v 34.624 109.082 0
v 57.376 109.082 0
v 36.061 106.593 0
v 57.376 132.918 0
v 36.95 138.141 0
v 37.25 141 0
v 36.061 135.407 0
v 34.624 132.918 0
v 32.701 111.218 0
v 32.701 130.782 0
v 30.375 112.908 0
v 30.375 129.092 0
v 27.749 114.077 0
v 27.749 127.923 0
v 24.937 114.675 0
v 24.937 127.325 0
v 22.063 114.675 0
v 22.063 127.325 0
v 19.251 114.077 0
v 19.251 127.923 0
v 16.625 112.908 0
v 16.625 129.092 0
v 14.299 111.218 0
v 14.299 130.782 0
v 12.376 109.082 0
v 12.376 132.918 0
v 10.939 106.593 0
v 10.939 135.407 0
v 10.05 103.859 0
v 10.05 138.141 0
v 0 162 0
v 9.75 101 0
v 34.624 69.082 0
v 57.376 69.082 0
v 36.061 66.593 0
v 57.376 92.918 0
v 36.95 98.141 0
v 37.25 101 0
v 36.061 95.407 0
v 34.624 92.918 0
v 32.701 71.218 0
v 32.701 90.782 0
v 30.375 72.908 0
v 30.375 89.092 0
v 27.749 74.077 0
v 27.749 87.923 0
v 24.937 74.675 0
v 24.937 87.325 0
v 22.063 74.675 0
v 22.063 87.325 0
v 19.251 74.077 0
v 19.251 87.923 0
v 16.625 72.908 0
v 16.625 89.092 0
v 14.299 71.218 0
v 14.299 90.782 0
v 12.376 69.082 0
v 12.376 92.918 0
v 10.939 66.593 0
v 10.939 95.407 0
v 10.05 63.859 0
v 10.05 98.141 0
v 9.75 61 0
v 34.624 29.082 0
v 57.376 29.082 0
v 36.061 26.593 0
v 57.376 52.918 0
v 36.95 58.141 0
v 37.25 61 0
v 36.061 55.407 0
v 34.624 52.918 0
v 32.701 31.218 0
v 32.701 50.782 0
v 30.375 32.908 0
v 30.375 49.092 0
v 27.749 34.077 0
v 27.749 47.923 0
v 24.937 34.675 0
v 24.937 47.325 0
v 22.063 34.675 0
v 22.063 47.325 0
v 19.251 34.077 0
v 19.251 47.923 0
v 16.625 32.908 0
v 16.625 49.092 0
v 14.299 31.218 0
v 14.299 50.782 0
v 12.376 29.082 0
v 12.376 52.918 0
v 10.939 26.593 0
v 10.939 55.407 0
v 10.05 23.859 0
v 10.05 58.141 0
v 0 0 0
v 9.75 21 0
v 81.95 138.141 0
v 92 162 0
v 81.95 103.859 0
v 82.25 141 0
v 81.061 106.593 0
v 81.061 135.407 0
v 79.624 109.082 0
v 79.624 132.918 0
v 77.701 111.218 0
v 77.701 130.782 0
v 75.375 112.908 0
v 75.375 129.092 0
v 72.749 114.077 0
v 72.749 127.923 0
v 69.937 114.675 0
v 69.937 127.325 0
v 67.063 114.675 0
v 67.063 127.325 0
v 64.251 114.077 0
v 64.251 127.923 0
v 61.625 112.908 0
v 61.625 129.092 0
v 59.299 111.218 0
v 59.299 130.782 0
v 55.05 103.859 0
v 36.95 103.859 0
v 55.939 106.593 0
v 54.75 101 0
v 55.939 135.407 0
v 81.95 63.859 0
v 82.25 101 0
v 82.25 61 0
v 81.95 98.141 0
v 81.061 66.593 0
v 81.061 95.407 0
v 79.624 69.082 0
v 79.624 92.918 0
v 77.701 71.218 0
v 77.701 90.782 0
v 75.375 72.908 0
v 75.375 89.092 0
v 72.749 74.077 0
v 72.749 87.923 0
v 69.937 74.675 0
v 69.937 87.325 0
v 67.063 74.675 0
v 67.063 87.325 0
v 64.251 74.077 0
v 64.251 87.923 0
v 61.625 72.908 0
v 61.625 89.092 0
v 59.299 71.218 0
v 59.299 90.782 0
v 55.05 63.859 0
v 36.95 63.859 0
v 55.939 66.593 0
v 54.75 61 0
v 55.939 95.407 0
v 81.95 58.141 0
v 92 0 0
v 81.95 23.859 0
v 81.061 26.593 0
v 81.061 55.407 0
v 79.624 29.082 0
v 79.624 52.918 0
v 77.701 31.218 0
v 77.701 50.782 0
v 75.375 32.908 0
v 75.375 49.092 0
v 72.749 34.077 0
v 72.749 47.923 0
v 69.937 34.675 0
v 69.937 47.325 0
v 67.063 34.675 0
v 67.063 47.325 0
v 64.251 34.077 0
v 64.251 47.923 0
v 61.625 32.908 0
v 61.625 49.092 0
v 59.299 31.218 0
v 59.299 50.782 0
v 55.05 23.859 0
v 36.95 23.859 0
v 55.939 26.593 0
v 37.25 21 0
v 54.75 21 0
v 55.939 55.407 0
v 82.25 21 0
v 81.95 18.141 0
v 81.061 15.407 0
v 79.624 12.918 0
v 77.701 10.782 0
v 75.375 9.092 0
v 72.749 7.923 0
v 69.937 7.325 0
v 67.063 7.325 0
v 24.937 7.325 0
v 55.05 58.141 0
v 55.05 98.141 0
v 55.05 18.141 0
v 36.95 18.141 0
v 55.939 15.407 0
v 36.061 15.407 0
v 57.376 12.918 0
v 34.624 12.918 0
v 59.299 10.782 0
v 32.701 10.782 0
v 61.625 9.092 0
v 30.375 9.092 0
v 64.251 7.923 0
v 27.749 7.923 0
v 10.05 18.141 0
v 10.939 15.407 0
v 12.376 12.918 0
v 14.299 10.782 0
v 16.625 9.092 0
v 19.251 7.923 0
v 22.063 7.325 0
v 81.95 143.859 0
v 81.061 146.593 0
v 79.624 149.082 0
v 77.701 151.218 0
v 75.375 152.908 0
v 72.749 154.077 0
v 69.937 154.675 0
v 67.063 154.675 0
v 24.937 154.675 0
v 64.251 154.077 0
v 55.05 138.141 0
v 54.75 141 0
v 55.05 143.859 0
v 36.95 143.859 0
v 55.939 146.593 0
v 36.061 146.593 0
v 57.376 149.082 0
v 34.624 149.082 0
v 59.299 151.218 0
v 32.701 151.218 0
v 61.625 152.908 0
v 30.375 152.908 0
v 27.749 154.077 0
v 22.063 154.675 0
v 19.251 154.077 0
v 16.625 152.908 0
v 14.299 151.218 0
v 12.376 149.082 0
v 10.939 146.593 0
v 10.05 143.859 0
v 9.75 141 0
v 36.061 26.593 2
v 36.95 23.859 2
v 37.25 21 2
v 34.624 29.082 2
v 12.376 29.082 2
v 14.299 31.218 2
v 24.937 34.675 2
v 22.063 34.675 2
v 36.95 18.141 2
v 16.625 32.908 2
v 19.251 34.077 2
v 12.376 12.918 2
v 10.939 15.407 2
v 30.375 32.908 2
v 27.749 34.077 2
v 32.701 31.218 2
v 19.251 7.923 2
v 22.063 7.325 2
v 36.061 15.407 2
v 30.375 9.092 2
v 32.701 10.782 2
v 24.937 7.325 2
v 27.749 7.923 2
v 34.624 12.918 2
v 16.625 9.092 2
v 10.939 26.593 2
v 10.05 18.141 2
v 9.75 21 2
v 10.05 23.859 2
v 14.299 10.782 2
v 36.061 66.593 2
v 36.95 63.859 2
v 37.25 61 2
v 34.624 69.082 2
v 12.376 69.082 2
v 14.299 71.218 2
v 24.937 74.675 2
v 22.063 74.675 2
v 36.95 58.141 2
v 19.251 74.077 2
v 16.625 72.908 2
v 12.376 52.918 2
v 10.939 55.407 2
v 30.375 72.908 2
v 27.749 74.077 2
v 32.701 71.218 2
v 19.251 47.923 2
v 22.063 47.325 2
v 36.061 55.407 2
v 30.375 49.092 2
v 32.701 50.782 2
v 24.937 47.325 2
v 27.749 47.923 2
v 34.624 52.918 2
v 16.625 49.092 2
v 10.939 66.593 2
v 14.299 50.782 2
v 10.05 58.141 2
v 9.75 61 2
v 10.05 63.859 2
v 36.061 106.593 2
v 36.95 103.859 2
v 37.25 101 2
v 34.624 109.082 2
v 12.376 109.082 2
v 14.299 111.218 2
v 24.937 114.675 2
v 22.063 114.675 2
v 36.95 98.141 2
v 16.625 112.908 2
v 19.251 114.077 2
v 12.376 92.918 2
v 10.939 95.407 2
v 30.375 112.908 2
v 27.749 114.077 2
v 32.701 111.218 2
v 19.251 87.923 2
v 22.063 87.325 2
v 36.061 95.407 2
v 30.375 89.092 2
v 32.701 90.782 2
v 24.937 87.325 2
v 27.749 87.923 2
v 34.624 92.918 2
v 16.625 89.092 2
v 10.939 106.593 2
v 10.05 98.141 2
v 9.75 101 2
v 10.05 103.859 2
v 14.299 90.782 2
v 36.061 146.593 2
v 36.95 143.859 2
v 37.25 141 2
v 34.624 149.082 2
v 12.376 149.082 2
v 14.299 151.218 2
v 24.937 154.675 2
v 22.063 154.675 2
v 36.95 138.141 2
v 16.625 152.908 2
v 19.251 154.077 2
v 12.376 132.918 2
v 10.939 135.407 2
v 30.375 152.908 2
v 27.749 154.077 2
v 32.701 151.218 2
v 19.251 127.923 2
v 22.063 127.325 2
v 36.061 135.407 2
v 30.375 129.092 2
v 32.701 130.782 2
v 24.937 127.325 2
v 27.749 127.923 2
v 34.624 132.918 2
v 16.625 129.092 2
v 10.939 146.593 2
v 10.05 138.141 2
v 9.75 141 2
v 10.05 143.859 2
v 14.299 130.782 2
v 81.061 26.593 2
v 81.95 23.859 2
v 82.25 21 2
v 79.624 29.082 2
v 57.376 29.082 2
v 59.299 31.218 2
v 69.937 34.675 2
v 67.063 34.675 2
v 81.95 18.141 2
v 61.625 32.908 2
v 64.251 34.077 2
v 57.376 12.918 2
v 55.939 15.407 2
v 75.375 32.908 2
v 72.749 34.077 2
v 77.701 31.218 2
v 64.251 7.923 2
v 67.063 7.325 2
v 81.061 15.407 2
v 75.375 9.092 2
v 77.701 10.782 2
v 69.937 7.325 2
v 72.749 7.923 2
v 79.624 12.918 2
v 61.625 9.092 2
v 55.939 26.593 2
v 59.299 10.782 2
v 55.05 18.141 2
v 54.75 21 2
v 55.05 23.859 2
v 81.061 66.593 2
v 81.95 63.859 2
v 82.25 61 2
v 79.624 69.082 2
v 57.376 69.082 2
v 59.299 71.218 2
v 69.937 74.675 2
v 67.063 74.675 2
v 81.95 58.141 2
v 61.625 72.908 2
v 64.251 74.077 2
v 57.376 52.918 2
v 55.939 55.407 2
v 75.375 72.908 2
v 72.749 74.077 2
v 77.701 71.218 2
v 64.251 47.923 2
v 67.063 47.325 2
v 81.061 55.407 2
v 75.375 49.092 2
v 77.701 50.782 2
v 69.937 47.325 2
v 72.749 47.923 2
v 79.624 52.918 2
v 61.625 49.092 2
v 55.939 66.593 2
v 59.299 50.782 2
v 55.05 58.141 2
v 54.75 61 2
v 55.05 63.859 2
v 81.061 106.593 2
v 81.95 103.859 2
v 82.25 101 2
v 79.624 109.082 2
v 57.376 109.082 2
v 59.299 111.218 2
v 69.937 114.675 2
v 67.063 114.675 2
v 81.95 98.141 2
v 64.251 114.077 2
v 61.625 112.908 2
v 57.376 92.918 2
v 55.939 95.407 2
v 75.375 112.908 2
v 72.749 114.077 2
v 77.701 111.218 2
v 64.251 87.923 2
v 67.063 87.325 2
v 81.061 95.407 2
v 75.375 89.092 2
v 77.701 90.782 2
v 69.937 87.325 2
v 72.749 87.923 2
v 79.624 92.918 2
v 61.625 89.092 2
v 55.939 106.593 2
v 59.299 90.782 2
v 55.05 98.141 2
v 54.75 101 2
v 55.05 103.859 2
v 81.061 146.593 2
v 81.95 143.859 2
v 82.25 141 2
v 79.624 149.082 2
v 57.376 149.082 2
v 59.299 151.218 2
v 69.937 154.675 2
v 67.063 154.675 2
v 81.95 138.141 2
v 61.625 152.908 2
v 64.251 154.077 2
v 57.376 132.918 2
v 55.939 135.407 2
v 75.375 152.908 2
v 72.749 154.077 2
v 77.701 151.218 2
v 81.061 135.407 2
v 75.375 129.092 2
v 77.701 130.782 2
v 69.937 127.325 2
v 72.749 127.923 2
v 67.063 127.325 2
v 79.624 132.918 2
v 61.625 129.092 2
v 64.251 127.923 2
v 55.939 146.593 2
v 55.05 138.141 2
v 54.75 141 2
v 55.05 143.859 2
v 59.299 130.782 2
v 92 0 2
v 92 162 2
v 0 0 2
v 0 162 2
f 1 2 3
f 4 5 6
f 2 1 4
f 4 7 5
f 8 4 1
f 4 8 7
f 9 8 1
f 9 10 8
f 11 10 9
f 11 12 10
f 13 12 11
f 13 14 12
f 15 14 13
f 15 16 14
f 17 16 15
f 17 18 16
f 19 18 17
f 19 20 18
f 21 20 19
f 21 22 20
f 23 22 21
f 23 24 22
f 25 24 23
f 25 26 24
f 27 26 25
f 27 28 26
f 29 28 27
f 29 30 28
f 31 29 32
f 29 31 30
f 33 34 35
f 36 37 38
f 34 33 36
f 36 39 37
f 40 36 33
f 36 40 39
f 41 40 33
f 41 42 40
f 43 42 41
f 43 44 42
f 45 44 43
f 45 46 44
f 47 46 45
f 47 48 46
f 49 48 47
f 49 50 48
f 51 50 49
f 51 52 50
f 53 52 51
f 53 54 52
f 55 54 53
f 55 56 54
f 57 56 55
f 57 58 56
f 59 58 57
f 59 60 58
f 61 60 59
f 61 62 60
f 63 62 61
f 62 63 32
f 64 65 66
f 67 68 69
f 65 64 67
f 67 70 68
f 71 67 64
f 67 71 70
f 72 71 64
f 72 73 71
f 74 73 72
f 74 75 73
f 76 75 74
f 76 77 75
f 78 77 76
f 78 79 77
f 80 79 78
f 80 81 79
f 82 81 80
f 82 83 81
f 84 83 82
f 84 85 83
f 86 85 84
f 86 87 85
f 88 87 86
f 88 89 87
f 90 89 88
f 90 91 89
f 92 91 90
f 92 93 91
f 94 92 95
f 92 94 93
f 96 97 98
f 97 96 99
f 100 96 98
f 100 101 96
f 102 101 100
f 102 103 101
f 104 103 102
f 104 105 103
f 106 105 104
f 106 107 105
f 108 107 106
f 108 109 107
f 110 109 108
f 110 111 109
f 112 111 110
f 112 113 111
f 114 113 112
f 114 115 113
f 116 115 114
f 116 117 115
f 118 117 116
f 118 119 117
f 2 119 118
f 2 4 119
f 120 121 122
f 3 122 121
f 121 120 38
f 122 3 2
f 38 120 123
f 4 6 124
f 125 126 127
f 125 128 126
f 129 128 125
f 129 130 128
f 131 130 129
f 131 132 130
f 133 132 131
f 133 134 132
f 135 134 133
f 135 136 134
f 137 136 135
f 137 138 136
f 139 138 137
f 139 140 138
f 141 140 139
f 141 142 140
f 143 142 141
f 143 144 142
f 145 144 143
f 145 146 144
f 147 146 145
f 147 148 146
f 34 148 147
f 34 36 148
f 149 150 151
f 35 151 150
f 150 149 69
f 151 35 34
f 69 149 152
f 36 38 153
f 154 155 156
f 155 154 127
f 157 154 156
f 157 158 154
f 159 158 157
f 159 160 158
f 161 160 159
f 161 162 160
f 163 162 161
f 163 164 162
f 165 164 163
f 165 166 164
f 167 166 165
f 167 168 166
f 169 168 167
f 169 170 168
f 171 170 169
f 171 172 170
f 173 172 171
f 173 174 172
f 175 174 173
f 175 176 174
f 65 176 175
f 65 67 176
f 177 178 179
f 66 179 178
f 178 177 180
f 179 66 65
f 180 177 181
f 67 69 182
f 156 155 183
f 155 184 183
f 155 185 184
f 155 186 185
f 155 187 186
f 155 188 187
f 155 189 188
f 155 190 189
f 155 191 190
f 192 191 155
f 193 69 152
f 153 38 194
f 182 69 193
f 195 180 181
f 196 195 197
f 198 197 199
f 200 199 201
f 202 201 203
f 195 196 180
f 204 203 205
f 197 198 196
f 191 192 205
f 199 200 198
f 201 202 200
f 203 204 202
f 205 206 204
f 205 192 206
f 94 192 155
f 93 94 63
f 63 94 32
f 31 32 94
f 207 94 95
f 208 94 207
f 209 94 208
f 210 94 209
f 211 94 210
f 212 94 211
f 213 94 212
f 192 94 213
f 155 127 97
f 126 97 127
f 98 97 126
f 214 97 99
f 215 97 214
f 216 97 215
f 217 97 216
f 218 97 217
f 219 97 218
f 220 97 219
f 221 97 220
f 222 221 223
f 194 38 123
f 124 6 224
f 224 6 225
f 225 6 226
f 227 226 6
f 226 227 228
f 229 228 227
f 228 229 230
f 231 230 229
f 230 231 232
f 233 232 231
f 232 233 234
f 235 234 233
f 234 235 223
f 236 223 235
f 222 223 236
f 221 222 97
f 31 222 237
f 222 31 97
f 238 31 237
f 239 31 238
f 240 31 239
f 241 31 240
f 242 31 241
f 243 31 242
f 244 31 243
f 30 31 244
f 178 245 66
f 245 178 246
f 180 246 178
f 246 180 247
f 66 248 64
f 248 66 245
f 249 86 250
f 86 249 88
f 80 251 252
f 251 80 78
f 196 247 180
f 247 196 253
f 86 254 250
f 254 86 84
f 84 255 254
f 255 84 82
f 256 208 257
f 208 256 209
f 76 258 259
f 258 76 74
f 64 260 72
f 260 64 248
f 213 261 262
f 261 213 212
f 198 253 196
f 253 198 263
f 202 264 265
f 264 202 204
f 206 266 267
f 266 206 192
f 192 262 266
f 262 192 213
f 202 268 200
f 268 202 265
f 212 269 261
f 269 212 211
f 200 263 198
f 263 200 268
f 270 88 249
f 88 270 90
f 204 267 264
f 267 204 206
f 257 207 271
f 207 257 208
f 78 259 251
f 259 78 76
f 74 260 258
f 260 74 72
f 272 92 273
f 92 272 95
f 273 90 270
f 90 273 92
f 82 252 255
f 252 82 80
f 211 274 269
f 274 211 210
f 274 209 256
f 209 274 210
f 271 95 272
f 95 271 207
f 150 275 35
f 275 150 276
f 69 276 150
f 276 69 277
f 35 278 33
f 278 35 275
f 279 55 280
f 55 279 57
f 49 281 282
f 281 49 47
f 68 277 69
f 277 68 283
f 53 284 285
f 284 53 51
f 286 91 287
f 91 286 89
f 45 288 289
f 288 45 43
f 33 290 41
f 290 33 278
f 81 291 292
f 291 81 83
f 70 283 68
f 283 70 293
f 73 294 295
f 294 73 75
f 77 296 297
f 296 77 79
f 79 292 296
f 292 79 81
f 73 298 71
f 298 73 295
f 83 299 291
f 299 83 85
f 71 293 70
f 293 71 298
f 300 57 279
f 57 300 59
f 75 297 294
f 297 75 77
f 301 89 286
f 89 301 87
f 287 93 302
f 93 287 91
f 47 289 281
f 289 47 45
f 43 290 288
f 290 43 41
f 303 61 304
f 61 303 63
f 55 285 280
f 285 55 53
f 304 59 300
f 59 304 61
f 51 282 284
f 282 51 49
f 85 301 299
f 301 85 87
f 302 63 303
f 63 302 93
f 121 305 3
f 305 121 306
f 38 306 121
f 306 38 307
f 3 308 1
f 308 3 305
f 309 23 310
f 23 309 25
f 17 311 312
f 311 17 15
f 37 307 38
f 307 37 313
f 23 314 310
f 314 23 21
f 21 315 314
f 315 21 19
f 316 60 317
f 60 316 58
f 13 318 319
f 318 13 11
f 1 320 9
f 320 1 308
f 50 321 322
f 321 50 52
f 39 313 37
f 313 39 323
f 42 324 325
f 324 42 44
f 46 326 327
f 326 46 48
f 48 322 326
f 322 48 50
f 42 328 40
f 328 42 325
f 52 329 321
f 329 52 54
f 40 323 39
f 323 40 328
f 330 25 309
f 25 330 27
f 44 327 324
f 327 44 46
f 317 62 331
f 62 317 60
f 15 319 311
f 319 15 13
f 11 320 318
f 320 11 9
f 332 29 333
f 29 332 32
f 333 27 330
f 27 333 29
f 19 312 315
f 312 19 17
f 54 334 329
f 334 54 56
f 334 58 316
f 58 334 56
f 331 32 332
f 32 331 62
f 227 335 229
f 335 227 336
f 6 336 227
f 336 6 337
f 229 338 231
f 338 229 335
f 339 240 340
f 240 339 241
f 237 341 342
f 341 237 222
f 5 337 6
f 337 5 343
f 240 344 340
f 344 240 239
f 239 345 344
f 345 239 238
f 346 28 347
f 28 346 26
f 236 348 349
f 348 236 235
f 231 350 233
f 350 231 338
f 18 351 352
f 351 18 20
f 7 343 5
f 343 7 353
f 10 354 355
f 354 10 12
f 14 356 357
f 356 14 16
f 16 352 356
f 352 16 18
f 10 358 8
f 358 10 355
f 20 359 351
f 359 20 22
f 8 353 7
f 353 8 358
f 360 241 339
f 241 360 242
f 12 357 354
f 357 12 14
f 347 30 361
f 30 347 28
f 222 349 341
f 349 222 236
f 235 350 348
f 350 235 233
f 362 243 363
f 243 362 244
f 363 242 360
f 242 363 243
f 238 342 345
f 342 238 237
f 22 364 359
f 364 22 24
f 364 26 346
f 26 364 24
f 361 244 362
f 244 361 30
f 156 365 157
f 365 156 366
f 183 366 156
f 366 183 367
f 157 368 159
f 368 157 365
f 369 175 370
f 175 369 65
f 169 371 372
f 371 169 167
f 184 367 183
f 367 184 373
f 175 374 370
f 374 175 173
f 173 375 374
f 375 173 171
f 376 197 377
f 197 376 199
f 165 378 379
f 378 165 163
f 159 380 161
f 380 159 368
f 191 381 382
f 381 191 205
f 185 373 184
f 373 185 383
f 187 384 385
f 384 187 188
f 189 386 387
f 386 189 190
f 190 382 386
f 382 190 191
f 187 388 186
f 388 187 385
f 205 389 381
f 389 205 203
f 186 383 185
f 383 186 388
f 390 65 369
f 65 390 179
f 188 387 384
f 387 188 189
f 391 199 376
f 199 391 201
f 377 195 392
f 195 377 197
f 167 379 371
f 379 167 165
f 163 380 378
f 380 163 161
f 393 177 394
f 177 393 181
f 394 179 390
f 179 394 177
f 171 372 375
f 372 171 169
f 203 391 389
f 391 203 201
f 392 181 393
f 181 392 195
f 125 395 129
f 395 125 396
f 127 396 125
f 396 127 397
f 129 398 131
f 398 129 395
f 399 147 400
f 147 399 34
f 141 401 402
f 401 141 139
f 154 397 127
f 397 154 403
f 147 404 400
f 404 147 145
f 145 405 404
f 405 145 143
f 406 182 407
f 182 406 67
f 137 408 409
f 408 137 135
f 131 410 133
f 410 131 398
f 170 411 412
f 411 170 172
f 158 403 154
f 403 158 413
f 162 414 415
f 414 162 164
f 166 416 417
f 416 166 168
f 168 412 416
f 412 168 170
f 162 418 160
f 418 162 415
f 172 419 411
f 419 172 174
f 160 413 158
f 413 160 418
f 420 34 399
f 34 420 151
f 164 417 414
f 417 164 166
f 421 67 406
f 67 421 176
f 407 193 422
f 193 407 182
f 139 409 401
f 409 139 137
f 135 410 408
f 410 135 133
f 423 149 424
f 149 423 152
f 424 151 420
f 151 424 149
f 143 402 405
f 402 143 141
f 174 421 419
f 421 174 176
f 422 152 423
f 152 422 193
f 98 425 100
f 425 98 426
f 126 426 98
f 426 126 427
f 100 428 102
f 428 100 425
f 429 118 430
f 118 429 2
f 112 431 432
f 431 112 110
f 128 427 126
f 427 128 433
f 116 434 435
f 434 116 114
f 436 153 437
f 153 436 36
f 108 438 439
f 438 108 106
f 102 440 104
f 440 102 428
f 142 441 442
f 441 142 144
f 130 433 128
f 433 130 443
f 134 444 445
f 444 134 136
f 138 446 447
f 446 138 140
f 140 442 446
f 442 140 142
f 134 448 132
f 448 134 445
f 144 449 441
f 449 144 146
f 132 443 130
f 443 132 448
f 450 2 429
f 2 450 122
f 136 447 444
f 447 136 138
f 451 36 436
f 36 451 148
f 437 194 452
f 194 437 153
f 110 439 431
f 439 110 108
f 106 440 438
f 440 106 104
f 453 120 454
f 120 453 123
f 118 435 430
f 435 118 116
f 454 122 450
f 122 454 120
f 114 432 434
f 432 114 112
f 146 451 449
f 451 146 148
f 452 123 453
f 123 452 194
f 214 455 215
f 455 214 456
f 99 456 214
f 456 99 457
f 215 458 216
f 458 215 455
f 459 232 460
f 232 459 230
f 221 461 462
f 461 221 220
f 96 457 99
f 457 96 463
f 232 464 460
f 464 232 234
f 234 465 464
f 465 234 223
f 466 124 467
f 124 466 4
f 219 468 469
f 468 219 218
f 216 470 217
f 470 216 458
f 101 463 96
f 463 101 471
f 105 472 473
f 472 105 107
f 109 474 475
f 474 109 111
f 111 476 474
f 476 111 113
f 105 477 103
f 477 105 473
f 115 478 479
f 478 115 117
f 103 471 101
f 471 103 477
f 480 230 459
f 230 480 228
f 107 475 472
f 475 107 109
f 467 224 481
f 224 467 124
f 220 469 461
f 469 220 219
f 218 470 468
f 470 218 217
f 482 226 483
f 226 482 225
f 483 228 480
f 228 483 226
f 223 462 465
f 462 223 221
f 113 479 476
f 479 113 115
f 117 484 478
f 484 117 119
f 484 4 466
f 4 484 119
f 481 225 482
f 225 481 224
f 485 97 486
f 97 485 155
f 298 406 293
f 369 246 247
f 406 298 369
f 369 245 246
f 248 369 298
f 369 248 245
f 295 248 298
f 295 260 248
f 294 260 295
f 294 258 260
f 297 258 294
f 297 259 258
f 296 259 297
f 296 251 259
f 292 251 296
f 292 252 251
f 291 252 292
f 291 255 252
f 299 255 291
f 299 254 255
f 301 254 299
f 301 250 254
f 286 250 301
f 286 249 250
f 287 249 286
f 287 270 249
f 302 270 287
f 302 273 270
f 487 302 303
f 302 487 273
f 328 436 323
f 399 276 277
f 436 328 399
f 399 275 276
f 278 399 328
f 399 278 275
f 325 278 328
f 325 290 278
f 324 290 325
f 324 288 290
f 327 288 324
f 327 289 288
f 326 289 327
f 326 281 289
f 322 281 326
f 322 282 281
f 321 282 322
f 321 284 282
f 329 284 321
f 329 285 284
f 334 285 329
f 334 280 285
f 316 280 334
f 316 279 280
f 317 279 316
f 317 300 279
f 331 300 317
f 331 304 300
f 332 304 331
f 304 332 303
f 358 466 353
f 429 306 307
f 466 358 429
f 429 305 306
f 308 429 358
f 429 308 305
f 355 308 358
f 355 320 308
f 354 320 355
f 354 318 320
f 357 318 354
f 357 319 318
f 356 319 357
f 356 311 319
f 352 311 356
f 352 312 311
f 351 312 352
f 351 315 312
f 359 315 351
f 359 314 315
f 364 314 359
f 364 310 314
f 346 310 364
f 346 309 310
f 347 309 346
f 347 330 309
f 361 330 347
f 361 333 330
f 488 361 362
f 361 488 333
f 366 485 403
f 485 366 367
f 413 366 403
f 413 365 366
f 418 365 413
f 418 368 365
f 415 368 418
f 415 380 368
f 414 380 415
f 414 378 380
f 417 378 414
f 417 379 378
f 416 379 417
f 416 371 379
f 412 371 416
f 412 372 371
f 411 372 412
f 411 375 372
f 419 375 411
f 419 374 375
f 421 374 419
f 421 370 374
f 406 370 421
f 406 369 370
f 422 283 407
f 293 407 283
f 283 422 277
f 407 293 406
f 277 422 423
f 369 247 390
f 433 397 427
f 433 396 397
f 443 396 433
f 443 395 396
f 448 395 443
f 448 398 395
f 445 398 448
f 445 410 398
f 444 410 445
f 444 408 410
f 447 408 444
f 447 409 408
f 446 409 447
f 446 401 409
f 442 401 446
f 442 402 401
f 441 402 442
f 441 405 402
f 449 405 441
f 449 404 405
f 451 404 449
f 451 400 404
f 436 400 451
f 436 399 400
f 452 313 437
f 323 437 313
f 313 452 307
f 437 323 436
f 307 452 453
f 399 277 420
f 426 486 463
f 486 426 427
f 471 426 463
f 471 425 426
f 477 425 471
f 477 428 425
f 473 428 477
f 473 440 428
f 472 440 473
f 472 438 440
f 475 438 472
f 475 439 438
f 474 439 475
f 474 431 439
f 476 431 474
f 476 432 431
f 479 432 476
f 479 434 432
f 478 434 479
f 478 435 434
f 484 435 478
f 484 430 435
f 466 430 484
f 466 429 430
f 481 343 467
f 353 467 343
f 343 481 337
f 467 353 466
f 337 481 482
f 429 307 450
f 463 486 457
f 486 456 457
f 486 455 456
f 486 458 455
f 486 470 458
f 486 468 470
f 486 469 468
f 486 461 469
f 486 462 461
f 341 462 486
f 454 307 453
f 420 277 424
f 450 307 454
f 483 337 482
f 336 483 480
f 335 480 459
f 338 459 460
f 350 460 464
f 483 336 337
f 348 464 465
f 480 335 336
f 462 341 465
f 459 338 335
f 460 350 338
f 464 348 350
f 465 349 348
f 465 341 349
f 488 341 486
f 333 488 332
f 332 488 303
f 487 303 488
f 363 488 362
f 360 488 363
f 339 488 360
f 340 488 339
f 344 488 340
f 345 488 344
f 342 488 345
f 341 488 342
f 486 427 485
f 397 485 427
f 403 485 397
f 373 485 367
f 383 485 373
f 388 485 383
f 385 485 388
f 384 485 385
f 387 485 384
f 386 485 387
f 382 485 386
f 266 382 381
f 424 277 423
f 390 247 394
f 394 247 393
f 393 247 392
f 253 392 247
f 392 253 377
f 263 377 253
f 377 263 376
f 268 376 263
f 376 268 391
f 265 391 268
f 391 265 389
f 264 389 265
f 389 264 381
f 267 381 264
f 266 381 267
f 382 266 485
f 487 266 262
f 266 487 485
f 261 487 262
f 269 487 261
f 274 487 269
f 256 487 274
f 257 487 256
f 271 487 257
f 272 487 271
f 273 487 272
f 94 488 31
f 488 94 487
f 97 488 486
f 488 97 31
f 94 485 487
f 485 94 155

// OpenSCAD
Render = "lid"; // [case:Case,lid:Lid]

wall_thickness=2;
corner_thickness_factor=3;
lid_thickness=2;
floor_thickness=10;
wall_height=70;
wall_width=90;
wall_length=160;
button_diameter=27.5;
buttons_per_row=4;
button_rows=2;

buttonSpace=wall_length/buttons_per_row;

module case() {
    translate([0,0,0])
        cube([wall_width,wall_thickness,wall_height]);
        cube([wall_thickness,wall_length,wall_height]);
        cube([wall_width,wall_length,floor_thickness]); // floor

    translate([0,wall_length,0])
        cube([wall_width,wall_thickness,wall_height]);

    translate([wall_width,0,0])
        cube([wall_thickness,wall_length+wall_thickness,wall_height]);

    // Corners
    translate([wall_thickness,wall_thickness,0])
        cube([wall_thickness*corner_thickness_factor,wall_thickness*corner_thickness_factor,wall_height]);
    translate([wall_width-wall_thickness*3,wall_thickness,0])
        cube([wall_thickness*corner_thickness_factor,wall_thickness*corner_thickness_factor,wall_height]);
    translate([wall_thickness,wall_length-wall_thickness*3,0])
        cube([wall_thickness*corner_thickness_factor,wall_thickness*corner_thickness_factor,wall_height]);
    translate([wall_width-wall_thickness*3,wall_length-wall_thickness*3,0])
        cube([wall_thickness*corner_thickness_factor,wall_thickness*corner_thickness_factor,wall_height]);


};

module lid() {
    difference() {
        translate([0,0,0]) cube([wall_width+wall_thickness,wall_length+wall_thickness,lid_thickness]); // lid
        for ( r = [1:2:3] ) {        
            for ( h = [0:buttons_per_row-1] ) {
               translate ([wall_width/4*r+wall_thickness/2,buttonSpace*h+wall_thickness/2+buttonSpace/2,0]) cylinder(lid_thickness*2, button_diameter/2,button_diameter/2);
            };
        };
    };
};
 
if (Render=="case") {
    case();
} else if (Render=="lid") {
    lid();
}
